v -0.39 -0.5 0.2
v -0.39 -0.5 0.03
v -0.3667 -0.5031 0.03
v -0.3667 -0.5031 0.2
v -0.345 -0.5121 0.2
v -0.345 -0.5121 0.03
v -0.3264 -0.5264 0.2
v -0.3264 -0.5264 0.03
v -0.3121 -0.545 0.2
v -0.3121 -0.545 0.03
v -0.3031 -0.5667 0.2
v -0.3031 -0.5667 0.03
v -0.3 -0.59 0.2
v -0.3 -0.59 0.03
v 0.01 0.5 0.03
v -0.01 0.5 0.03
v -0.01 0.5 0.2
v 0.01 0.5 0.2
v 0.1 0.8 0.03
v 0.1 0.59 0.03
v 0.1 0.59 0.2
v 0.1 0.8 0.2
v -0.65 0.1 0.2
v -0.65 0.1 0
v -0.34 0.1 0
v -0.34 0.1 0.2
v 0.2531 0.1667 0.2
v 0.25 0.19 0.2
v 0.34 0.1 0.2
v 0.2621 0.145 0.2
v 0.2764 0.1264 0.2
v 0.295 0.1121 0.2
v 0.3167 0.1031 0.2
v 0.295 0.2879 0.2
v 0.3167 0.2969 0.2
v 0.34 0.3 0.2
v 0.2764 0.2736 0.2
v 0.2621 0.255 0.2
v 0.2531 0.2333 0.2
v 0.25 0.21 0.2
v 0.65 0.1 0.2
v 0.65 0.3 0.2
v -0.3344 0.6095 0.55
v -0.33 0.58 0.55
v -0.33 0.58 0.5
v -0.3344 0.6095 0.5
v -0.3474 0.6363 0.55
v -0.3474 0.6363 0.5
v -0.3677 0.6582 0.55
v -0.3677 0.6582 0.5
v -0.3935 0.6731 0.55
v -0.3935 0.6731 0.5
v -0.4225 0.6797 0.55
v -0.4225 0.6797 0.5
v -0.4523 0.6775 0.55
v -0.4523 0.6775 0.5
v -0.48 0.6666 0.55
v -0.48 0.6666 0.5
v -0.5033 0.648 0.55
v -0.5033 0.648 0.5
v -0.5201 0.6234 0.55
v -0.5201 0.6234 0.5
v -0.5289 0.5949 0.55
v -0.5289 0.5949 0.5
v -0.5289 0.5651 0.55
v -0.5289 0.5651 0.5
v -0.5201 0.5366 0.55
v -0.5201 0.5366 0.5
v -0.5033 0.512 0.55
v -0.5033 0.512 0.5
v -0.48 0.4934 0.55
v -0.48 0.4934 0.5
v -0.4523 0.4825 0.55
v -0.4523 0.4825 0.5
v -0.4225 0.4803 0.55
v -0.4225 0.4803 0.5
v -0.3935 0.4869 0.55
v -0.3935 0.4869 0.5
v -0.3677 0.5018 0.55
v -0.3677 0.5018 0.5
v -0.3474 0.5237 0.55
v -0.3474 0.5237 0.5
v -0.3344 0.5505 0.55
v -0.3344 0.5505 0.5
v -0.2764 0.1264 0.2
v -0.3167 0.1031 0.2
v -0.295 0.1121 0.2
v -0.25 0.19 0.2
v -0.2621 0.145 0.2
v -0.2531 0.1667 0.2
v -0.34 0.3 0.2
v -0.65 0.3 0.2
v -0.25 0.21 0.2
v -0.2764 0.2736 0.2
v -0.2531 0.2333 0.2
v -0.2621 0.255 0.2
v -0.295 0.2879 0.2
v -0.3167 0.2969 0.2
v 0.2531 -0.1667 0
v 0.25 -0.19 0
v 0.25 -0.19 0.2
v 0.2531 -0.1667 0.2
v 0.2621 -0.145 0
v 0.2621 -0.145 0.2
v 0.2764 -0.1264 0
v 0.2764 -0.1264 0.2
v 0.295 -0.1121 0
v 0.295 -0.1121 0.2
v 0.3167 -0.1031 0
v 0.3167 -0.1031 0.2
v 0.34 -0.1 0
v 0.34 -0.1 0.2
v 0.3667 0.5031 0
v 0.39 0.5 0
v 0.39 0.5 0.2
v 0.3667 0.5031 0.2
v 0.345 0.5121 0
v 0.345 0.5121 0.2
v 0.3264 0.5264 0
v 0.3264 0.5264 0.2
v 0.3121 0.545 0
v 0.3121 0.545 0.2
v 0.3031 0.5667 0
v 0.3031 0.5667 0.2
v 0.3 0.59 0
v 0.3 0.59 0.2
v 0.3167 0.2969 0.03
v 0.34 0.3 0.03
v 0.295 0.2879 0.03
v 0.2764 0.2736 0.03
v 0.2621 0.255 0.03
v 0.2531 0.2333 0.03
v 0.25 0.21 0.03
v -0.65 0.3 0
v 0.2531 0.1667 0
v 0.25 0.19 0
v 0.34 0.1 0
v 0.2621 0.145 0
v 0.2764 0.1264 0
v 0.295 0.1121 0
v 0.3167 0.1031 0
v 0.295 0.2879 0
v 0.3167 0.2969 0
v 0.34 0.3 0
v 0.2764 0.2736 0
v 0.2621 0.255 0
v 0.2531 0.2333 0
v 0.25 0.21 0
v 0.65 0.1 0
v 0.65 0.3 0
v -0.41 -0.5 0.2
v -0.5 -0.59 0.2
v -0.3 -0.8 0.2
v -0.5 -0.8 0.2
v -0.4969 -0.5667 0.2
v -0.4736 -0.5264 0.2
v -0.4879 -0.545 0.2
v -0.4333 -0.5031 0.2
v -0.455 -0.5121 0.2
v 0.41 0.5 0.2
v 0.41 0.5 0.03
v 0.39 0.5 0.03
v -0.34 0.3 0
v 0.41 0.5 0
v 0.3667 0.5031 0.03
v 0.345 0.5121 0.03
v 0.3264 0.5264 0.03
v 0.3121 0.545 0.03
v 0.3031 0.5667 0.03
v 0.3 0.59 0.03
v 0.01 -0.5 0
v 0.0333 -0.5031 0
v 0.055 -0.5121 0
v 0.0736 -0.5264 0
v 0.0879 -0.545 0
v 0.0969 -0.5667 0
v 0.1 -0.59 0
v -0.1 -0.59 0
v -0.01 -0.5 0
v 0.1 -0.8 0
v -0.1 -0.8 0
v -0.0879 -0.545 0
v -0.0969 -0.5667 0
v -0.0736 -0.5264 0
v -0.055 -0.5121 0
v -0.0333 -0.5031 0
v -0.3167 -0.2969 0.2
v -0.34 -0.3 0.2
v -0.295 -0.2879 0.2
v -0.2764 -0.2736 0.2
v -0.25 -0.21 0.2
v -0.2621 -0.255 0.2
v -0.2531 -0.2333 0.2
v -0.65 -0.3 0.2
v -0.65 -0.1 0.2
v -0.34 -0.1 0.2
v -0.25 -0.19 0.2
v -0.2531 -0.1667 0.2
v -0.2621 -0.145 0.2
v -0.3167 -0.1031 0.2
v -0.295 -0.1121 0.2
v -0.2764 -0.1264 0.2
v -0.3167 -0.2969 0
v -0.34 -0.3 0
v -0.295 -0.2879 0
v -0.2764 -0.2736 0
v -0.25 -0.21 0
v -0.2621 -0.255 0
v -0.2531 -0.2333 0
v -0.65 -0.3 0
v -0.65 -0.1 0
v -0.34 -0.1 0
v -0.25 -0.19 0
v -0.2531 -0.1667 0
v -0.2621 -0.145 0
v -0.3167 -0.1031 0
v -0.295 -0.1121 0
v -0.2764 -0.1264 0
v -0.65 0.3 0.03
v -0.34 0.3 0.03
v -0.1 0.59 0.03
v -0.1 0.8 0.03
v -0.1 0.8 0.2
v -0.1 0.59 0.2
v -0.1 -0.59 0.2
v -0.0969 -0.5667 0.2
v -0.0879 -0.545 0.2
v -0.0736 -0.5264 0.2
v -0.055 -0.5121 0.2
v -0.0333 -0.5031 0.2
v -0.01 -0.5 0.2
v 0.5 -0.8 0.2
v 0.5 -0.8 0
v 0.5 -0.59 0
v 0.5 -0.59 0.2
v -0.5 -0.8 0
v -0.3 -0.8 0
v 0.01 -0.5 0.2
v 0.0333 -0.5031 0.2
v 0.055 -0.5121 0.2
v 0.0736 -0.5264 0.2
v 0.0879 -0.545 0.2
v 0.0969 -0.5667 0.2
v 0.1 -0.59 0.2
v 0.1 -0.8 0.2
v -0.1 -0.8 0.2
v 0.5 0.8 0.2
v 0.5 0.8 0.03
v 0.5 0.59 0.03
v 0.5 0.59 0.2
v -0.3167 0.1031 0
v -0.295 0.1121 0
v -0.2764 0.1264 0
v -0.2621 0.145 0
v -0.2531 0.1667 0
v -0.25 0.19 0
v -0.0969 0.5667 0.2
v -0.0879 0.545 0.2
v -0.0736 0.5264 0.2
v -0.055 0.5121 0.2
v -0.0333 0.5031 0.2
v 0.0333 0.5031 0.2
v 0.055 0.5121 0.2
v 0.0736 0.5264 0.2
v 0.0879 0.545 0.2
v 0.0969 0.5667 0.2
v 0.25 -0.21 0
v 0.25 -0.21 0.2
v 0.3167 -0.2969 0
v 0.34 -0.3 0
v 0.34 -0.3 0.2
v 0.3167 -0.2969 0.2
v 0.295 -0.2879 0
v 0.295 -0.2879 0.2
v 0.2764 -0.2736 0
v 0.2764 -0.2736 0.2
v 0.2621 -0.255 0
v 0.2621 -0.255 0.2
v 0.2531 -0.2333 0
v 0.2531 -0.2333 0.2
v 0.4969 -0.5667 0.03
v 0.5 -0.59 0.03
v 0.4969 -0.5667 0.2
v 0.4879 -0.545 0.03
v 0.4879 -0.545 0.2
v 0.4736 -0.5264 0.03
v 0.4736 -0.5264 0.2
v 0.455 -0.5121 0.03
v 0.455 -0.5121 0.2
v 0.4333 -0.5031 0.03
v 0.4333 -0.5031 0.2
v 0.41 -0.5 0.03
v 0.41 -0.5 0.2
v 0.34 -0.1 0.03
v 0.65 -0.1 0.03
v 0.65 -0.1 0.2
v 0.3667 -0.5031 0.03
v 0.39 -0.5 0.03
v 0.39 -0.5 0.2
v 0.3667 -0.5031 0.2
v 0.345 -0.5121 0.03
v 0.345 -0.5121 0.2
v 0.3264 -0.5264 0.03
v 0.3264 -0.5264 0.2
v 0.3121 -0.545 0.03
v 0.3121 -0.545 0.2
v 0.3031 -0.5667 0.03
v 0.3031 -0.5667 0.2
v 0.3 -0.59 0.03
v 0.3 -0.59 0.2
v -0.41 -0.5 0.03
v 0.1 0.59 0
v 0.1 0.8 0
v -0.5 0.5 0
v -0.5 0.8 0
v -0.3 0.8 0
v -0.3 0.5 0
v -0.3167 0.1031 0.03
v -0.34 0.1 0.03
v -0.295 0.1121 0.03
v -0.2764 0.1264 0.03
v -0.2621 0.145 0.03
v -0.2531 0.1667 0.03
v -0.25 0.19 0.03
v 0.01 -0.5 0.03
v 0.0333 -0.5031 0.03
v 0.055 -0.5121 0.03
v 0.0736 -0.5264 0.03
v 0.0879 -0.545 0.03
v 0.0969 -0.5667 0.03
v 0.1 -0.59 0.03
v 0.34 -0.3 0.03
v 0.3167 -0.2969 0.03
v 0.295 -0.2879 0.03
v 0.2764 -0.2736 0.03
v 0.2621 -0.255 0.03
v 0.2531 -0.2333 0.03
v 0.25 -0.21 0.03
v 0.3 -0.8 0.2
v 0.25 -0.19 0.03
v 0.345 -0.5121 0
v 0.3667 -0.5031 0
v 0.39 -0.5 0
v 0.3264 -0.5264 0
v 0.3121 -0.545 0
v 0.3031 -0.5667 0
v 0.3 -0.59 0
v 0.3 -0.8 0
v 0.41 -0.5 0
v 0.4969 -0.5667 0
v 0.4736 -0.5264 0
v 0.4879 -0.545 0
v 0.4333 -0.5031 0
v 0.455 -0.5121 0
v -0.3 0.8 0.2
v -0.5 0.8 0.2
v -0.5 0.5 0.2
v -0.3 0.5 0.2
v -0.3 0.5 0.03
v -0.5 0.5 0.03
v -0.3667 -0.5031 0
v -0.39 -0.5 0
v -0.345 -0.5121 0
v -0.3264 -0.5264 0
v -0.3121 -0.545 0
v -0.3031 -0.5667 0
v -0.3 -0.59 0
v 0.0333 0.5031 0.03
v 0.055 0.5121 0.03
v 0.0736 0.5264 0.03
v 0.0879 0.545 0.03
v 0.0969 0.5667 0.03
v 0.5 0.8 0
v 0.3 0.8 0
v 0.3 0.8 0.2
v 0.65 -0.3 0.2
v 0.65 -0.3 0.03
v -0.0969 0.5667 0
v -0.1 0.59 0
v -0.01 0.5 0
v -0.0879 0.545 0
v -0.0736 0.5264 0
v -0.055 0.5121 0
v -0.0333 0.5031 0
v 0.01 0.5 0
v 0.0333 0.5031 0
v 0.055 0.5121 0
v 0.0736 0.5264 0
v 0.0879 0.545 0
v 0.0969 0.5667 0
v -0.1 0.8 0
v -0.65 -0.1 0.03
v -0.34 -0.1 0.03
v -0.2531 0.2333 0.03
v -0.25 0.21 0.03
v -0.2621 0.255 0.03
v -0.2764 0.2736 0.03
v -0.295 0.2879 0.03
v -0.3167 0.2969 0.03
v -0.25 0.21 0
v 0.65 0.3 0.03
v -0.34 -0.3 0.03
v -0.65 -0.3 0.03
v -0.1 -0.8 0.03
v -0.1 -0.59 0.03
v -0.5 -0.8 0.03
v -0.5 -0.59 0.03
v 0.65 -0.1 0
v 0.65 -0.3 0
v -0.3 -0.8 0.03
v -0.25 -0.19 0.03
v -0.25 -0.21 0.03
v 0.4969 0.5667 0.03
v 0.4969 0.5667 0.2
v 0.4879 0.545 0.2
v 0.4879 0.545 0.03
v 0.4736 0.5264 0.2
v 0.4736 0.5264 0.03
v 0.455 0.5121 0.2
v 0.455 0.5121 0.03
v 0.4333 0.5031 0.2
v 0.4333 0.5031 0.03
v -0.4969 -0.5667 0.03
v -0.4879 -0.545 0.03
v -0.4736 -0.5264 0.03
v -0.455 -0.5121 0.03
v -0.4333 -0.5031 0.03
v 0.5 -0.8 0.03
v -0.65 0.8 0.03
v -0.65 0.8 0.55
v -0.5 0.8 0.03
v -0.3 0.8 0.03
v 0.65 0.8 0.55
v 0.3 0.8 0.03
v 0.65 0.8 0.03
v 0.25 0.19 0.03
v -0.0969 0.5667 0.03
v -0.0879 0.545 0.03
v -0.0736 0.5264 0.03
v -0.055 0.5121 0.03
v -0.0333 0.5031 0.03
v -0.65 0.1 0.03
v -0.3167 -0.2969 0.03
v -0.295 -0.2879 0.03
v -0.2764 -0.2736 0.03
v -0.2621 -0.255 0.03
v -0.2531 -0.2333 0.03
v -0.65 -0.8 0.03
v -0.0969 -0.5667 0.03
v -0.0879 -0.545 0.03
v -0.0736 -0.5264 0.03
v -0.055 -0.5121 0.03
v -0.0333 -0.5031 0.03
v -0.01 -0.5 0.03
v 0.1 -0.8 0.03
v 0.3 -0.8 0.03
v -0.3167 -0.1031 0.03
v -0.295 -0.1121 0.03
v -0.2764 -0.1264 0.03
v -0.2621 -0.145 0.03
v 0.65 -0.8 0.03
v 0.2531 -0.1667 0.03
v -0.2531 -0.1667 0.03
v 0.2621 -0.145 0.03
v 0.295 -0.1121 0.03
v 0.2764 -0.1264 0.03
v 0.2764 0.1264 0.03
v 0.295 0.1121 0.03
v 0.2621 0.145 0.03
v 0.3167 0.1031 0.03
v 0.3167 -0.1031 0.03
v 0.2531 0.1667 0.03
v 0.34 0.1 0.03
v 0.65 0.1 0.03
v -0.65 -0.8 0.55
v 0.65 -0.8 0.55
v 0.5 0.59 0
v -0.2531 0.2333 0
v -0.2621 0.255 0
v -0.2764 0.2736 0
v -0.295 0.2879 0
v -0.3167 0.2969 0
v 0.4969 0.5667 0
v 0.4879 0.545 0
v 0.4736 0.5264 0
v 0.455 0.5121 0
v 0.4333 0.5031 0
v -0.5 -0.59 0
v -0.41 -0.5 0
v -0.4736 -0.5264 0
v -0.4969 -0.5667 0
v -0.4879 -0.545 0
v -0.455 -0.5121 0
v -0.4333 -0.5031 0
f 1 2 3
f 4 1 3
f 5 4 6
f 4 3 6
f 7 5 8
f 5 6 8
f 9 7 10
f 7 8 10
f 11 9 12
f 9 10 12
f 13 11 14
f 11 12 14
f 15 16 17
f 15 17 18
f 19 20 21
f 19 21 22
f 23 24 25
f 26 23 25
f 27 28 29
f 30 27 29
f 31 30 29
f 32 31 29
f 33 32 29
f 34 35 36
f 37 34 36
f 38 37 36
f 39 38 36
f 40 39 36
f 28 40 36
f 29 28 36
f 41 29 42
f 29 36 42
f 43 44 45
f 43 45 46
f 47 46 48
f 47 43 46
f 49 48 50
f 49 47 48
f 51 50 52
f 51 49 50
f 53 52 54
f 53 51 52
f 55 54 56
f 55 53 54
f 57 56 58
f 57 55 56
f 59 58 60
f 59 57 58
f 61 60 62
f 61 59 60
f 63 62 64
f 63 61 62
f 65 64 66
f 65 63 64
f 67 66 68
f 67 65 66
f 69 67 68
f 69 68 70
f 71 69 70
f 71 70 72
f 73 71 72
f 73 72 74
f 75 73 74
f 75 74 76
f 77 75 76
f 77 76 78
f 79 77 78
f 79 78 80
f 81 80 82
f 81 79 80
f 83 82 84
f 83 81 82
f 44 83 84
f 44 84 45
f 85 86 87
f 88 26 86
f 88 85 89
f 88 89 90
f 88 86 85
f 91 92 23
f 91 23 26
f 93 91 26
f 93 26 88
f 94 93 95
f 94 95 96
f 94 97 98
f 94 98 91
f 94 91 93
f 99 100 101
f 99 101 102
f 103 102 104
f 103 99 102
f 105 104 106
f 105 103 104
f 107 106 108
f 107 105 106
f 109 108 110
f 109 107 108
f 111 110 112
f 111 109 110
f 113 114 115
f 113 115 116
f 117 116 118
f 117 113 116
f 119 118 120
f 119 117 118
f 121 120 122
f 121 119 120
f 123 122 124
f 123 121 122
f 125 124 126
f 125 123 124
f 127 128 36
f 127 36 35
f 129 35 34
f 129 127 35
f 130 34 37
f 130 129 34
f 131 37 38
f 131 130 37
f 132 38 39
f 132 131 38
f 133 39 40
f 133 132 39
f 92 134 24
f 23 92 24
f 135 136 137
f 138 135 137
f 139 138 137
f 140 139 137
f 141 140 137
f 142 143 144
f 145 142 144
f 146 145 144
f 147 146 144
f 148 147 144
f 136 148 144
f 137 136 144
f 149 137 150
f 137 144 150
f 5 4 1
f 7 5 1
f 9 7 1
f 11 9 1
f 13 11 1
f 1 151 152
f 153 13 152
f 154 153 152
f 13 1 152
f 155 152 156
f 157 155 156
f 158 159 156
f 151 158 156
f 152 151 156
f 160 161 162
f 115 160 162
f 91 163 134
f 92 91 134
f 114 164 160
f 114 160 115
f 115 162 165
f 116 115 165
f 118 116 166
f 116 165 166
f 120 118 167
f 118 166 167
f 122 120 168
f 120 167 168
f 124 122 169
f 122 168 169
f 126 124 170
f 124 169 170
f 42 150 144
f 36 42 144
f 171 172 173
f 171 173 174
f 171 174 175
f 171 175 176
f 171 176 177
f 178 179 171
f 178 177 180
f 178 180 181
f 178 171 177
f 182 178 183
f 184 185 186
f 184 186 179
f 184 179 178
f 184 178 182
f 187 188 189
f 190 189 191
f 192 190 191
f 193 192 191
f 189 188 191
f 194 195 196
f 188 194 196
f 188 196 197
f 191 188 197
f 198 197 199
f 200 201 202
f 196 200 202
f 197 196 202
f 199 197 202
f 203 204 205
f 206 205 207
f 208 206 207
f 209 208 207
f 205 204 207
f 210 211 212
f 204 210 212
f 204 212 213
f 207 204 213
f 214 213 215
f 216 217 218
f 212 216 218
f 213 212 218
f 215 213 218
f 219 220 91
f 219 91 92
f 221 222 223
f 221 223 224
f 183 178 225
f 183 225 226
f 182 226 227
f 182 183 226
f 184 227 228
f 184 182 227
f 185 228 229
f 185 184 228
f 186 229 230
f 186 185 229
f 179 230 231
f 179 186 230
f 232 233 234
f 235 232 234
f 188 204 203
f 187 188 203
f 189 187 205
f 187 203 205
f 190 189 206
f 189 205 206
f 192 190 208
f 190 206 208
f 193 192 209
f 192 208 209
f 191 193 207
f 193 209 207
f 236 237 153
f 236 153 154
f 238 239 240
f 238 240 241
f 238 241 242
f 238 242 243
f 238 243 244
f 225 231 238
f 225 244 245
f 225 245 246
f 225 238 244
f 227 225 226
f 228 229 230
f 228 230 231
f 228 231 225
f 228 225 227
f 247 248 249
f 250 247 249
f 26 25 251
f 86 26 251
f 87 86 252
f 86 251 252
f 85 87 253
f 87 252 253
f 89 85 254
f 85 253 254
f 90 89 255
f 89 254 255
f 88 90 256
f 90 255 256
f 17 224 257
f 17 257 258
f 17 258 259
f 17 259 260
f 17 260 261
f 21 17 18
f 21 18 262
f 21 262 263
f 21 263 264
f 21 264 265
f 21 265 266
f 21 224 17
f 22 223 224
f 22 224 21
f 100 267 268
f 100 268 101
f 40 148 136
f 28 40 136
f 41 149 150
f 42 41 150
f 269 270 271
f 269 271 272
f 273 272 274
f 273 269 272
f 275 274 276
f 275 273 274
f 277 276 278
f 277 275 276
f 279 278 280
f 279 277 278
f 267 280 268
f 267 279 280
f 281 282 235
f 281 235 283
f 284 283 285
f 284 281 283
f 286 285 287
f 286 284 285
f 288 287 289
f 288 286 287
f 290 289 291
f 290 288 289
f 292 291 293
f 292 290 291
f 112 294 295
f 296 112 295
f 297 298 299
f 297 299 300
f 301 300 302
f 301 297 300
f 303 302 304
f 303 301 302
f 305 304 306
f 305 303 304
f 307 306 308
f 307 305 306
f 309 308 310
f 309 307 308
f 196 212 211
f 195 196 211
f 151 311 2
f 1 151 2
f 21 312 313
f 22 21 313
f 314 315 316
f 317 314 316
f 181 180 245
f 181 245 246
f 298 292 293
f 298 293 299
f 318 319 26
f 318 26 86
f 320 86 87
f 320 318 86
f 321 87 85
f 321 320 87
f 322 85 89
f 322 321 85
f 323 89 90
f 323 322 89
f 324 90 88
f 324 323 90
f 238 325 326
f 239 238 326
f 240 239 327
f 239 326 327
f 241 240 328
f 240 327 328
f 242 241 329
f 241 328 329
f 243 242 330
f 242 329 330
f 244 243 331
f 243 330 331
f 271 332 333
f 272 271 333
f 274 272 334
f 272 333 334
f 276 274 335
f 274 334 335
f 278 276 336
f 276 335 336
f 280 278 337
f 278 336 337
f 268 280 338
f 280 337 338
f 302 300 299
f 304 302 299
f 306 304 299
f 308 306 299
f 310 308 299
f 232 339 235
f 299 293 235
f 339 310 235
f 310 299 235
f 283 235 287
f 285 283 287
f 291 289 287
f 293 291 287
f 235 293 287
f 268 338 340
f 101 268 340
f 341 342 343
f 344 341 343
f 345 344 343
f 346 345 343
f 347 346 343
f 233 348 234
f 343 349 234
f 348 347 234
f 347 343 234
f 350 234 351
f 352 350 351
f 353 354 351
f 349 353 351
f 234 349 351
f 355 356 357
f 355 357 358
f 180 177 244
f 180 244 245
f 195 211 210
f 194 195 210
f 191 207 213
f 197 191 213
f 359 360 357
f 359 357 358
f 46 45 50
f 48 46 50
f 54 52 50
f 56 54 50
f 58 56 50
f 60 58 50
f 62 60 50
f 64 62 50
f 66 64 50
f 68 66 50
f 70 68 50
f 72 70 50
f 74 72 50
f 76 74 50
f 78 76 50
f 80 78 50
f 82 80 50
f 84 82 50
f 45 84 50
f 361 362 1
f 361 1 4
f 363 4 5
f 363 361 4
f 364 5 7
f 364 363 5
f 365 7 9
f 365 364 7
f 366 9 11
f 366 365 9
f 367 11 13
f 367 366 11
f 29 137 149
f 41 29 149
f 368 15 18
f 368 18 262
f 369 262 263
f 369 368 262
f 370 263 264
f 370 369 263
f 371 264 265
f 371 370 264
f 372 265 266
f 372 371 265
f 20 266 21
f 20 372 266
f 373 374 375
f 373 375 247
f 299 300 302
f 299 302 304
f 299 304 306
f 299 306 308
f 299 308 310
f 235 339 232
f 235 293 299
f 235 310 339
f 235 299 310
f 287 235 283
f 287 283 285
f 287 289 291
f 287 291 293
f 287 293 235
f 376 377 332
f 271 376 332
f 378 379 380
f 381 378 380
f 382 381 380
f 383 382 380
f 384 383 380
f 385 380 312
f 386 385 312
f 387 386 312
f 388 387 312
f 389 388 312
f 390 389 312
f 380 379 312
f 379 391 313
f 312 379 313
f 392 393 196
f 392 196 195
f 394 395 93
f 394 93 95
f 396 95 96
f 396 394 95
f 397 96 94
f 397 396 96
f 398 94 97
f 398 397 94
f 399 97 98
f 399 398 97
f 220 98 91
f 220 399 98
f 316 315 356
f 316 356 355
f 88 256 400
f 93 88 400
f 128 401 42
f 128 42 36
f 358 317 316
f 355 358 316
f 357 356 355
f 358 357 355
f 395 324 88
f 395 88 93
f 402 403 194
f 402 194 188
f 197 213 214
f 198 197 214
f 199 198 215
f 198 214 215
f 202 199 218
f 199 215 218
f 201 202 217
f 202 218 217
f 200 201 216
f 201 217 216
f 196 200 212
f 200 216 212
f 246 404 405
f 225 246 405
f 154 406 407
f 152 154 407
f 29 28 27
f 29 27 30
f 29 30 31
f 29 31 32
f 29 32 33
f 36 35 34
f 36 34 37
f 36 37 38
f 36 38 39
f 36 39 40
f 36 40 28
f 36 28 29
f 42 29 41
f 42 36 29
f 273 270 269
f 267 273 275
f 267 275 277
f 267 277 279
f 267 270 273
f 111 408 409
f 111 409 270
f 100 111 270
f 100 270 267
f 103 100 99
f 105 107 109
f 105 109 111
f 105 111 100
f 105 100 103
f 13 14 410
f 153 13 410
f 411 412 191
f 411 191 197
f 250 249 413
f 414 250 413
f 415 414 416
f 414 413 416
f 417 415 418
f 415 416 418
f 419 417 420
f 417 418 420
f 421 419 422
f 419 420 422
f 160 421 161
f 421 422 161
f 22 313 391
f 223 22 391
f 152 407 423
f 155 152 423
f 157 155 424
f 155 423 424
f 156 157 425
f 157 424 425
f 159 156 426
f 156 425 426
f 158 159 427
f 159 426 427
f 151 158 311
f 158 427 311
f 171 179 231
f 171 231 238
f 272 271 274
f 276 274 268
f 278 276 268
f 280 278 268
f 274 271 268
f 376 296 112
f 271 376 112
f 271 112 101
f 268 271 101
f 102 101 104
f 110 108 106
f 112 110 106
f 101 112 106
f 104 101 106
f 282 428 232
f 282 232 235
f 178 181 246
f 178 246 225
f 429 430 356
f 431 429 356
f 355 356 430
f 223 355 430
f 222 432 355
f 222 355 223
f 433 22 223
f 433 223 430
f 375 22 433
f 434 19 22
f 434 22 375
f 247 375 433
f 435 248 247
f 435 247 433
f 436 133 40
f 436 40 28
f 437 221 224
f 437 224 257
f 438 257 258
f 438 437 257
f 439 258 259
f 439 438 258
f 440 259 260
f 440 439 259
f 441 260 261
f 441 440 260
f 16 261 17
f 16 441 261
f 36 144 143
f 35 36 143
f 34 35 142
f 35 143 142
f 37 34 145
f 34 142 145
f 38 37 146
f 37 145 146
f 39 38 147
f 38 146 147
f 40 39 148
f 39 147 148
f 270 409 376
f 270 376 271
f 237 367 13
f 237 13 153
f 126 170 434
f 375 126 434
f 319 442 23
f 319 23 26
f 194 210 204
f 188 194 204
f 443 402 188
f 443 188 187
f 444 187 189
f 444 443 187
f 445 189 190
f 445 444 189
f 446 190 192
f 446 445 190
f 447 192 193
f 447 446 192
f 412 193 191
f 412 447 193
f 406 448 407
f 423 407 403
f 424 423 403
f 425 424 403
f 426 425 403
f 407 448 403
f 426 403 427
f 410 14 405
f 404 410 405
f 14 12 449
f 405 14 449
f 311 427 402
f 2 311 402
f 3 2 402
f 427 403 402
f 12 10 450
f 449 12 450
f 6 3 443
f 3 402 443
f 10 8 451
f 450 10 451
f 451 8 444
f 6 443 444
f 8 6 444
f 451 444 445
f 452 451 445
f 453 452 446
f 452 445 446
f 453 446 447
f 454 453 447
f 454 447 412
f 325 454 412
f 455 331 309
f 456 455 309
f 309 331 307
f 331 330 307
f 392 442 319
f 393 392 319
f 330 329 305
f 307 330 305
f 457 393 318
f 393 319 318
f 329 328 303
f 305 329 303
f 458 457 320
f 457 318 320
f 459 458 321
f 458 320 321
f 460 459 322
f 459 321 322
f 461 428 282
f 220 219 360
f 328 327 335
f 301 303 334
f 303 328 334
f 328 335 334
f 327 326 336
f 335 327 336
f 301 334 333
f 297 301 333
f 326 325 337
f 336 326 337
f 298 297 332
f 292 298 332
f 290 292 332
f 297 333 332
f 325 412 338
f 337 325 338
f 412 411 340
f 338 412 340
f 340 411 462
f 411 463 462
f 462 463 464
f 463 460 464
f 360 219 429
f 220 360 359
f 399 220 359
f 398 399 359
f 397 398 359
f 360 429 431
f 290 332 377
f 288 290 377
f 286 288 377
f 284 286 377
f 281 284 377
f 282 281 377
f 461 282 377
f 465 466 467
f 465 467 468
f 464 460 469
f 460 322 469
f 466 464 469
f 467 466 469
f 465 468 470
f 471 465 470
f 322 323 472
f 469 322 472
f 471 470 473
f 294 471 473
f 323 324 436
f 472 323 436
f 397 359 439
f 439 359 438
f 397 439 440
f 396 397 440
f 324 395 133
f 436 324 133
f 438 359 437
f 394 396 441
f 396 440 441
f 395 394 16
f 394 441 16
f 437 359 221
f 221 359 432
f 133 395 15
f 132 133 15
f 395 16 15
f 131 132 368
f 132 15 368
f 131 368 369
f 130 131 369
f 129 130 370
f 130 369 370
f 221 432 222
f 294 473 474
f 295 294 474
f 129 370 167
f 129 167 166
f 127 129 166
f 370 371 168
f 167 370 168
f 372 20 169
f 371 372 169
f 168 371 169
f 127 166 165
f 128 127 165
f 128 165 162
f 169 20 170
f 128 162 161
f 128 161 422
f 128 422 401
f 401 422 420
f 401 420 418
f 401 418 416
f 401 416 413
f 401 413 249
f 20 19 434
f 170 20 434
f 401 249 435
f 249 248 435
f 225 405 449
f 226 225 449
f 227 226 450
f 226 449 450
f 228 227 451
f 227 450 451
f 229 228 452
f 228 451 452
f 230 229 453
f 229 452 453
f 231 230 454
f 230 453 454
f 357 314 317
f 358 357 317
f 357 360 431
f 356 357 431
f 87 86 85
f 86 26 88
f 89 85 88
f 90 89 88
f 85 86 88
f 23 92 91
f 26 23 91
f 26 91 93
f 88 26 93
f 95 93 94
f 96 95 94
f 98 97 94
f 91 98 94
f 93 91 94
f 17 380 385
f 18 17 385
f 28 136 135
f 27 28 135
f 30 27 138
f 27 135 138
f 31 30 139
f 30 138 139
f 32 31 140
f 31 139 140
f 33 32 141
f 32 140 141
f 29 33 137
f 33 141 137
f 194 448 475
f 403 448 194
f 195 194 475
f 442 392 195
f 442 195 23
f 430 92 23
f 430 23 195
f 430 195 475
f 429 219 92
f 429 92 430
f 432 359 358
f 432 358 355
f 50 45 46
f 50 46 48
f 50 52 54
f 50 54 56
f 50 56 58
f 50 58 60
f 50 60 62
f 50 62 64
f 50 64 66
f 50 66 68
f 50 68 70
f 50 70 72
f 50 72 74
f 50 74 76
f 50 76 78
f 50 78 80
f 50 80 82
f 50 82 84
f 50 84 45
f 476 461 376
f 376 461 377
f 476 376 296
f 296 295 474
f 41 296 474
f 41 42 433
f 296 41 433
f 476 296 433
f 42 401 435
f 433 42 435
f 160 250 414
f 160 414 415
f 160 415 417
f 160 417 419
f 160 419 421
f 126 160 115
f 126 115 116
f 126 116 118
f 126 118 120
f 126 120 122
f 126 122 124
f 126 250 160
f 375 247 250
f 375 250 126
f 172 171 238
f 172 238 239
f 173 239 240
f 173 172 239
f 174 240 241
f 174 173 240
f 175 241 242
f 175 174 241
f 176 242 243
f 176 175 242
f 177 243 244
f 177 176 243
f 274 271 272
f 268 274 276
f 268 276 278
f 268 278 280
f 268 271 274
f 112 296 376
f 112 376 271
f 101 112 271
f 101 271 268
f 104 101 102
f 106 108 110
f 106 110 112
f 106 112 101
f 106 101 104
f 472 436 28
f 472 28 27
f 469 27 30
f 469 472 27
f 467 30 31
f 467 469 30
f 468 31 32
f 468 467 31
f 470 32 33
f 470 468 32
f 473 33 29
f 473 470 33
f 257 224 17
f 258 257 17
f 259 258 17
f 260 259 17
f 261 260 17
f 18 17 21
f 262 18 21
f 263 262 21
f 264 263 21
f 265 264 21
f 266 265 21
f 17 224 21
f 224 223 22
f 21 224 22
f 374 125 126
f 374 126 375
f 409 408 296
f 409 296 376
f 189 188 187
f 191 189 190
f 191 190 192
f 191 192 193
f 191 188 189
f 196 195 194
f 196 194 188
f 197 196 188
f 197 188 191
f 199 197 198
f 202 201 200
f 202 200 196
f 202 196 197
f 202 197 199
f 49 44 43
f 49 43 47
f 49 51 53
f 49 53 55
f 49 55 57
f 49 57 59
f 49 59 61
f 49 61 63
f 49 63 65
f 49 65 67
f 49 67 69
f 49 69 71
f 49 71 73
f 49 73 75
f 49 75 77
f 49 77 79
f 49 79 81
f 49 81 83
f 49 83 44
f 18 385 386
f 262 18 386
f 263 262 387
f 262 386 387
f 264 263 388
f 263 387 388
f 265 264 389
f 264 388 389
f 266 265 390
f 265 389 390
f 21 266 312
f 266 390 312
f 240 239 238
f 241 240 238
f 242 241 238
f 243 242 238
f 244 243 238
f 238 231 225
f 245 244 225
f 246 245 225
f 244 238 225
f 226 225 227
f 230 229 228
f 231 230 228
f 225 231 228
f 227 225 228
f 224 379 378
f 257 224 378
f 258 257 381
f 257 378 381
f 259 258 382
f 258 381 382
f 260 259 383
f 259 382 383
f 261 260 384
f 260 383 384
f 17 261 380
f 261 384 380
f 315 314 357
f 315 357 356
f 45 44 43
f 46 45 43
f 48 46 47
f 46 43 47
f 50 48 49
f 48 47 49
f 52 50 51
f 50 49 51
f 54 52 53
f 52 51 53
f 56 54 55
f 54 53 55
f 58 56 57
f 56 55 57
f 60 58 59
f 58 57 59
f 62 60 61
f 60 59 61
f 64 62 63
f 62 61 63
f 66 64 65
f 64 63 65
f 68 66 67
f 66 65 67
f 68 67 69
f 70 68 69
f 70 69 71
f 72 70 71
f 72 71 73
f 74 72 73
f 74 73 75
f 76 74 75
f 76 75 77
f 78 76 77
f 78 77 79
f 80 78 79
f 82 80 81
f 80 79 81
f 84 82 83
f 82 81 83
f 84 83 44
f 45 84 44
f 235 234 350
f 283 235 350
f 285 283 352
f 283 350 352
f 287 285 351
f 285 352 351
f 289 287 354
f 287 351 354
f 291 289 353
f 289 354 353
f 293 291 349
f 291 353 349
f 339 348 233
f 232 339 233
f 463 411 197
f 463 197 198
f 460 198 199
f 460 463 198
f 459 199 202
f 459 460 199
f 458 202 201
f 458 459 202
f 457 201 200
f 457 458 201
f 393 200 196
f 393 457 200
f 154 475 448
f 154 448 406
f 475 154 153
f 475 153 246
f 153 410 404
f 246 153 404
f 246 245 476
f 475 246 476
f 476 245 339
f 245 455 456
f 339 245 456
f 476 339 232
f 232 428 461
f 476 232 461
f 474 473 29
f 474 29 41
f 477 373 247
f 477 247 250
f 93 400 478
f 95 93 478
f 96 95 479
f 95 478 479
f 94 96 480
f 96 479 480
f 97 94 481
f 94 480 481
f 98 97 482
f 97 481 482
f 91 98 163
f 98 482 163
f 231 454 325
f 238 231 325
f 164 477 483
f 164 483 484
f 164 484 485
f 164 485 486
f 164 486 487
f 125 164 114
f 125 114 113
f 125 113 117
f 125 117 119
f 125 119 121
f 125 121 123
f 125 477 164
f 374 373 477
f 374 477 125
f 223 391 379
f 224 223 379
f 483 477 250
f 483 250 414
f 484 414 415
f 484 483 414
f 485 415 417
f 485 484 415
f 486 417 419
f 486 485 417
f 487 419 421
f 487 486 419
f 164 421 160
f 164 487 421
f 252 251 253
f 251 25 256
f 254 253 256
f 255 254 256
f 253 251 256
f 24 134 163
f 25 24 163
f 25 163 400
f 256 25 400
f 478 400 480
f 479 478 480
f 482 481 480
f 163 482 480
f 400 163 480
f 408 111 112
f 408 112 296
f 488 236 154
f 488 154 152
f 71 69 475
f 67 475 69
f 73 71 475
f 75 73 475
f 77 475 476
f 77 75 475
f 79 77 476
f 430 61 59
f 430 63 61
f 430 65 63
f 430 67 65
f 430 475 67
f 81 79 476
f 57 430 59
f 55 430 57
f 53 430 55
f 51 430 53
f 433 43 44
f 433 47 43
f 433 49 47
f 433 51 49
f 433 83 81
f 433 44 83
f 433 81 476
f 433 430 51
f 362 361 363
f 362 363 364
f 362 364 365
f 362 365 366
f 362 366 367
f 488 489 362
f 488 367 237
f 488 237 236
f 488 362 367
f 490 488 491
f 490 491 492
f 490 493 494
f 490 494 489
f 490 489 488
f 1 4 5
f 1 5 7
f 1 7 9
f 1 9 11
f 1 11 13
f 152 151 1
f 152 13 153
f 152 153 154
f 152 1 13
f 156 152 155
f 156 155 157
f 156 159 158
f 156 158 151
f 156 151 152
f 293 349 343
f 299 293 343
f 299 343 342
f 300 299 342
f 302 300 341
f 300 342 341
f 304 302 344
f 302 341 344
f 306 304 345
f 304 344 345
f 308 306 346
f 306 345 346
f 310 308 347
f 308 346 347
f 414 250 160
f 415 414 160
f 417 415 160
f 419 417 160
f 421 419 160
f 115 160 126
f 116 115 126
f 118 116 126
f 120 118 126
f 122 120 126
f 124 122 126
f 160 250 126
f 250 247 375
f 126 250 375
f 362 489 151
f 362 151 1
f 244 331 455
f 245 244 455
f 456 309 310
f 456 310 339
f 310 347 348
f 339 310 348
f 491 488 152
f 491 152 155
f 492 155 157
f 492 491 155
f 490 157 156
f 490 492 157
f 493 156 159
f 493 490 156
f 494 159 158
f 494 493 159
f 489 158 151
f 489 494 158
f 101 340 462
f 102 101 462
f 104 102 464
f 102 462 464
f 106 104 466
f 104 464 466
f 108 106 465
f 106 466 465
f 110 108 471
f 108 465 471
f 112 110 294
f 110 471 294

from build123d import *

# Parameters (mm, degrees)
EXTRUDE_START       = 0.03
SKETCH_1_W          = 1.3
SKETCH_1_H          = 1.6
EXTRUDE_1_DEPTH     = 0.52
SKETCH_2_R          = 0.1
CUT_EXTRUDE_1_DEPTH = 0.05
SKETCH_2_2_R        = 0.1
EXTRUDE_1_2_DEPTH   = 0.05
SKETCH_3_W          = 0.2
SKETCH_3_H          = 0.3
CUT_EXTRUDE_2_DEPTH = 0.2
EXTRUDE_2_DEPTH     = 0.2
EXTRUDE_2_2_DEPTH   = 0.2
EXTRUDE_2_3_DEPTH   = 0.2
EXTRUDE_2_4_DEPTH   = 0.2
EXTRUDE_2_5_DEPTH   = 0.2
EXTRUDE_2_6_DEPTH   = 0.2
EXTRUDE_2_7_DEPTH   = 0.2
EXTRUDE_2_8_DEPTH   = 0.2
EXTRUDE_2_9_DEPTH   = 0.2
SKETCH_3_2_W        = 0.2
SKETCH_3_2_H        = 0.3
EXTRUDE_2_10_DEPTH  = 0.2


with BuildPart() as part:
    # Эскиз1 → Extrude 1 (new body)
    with BuildSketch(Plane.XY.offset(EXTRUDE_START)):
        Rectangle(SKETCH_1_W, SKETCH_1_H)
    extrude(amount=EXTRUDE_1_DEPTH)

    # Эскиз2 → Вырез-Вытянуть1 (cut)
    with BuildSketch(Plane.XY.offset(0.55)):
        with Locations((-0.43, 0.58)):
            Circle(SKETCH_2_R)
    extrude(amount=-CUT_EXTRUDE_1_DEPTH, mode=Mode.SUBTRACT)

    # Эскиз3 → Вырез-Вытянуть2 (cut)
    with BuildSketch(Plane.XY):
        with BuildLine():
            Line((-0.01, 0.5), (0.01, 0.5))
            ThreePointArc((0.01, 0.5), (0.07363961, 0.52636039), (0.1, 0.59))
            Line((0.1, 0.59), (0.1, 0.8))
            Line((0.1, 0.8), (-0.1, 0.8))
            Line((-0.1, 0.8), (-0.1, 0.59))
            ThreePointArc((-0.1, 0.59), (-0.07363961, 0.52636039), (-0.01, 0.5))
        make_face()
        with BuildLine():
            Line((-0.01, -0.5), (0.01, -0.5))
            ThreePointArc((0.01, -0.5), (0.07363961, -0.52636039), (0.1, -0.59))
            Line((0.1, -0.59), (0.1, -0.8))
            Line((0.1, -0.8), (-0.1, -0.8))
            Line((-0.1, -0.8), (-0.1, -0.59))
            ThreePointArc((-0.1, -0.59), (-0.07363961, -0.52636039), (-0.01, -0.5))
        make_face()
        with BuildLine():
            Line((-0.41, -0.5), (-0.39, -0.5))
            ThreePointArc((-0.39, -0.5), (-0.32636039, -0.52636039), (-0.3, -0.59))
            Line((-0.3, -0.59), (-0.3, -0.8))
            Line((-0.3, -0.8), (-0.5, -0.8))
            Line((-0.5, -0.8), (-0.5, -0.59))
            ThreePointArc((-0.5, -0.59), (-0.47363961, -0.52636039), (-0.41, -0.5))
        make_face()
        with BuildLine():
            Line((0.3, -0.8), (0.5, -0.8))
            Line((0.5, -0.8), (0.5, -0.59))
            ThreePointArc((0.5, -0.59), (0.47363961, -0.52636039), (0.41, -0.5))
            Line((0.41, -0.5), (0.39, -0.5))
            ThreePointArc((0.39, -0.5), (0.32636039, -0.52636039), (0.3, -0.59))
            Line((0.3, -0.59), (0.3, -0.8))
        make_face()
        with BuildLine():
            Line((0.65, -0.1), (0.65, -0.3))
            Line((0.65, -0.3), (0.34, -0.3))
            ThreePointArc((0.34, -0.3), (0.27636039, -0.27363961), (0.25, -0.21))
            Line((0.25, -0.21), (0.25, -0.19))
            ThreePointArc((0.25, -0.19), (0.27636039, -0.12636039), (0.34, -0.1))
            Line((0.34, -0.1), (0.65, -0.1))
        make_face()
        with BuildLine():
            Line((0.34, 0.1), (0.65, 0.1))
            Line((0.65, 0.1), (0.65, 0.3))
            Line((0.65, 0.3), (0.34, 0.3))
            ThreePointArc((0.34, 0.3), (0.27636039, 0.27363961), (0.25, 0.21))
            Line((0.25, 0.21), (0.25, 0.19))
            ThreePointArc((0.25, 0.19), (0.27636039, 0.12636039), (0.34, 0.1))
        make_face()
        with BuildLine():
            Line((-0.65, -0.1), (-0.65, -0.3))
            Line((-0.65, -0.3), (-0.34, -0.3))
            ThreePointArc((-0.34, -0.3), (-0.27636039, -0.27363961), (-0.25, -0.21))
            Line((-0.25, -0.21), (-0.25, -0.19))
            ThreePointArc((-0.25, -0.19), (-0.27636039, -0.12636039), (-0.34, -0.1))
            Line((-0.34, -0.1), (-0.65, -0.1))
        make_face()
        with BuildLine():
            Line((-0.25, 0.19), (-0.25, 0.21))
            ThreePointArc((-0.25, 0.21), (-0.27636039, 0.27363961), (-0.34, 0.3))
            Line((-0.34, 0.3), (-0.65, 0.3))
            Line((-0.65, 0.3), (-0.65, 0.1))
            Line((-0.65, 0.1), (-0.34, 0.1))
            ThreePointArc((-0.34, 0.1), (-0.27636039, 0.12636039), (-0.25, 0.19))
        make_face()
        with BuildLine():
            Line((0.3, 0.59), (0.3, 0.8))
            Line((0.3, 0.8), (0.5, 0.8))
            Line((0.5, 0.8), (0.5, 0.59))
            ThreePointArc((0.5, 0.59), (0.47363961, 0.52636039), (0.41, 0.5))
            Line((0.41, 0.5), (0.39, 0.5))
            ThreePointArc((0.39, 0.5), (0.32636039, 0.52636039), (0.3, 0.59))
        make_face()
        with Locations((-0.4, 0.65)):
            Rectangle(SKETCH_3_W, SKETCH_3_H)
    extrude(amount=CUT_EXTRUDE_2_DEPTH, mode=Mode.SUBTRACT)


with BuildPart() as body_2:
    # Эскиз2<2> → Extrude 1 2 (new body)
    with BuildSketch(Plane.XY.offset(0.55)):
        with Locations((-0.43, 0.58)):
            Circle(SKETCH_2_2_R)
    extrude(amount=-EXTRUDE_1_2_DEPTH)


with BuildPart() as body_3:
    # Эскиз3<2> → Бобышка-Вытянуть2 (new body)
    with BuildSketch(Plane.XY):
        with BuildLine():
            Line((-0.01, 0.5), (0.01, 0.5))
            ThreePointArc((0.01, 0.5), (0.07363961, 0.52636039), (0.1, 0.59))
            Line((0.1, 0.59), (0.1, 0.8))
            Line((0.1, 0.8), (-0.1, 0.8))
            Line((-0.1, 0.8), (-0.1, 0.59))
            ThreePointArc((-0.1, 0.59), (-0.07363961, 0.52636039), (-0.01, 0.5))
        make_face()
    extrude(amount=EXTRUDE_2_DEPTH)


with BuildPart() as body_4:
    # Эскиз3<2> → Extrude 2 2 (new body)
    with BuildSketch(Plane.XY):
        with BuildLine():
            Line((-0.01, -0.5), (0.01, -0.5))
            ThreePointArc((0.01, -0.5), (0.07363961, -0.52636039), (0.1, -0.59))
            Line((0.1, -0.59), (0.1, -0.8))
            Line((0.1, -0.8), (-0.1, -0.8))
            Line((-0.1, -0.8), (-0.1, -0.59))
            ThreePointArc((-0.1, -0.59), (-0.07363961, -0.52636039), (-0.01, -0.5))
        make_face()
    extrude(amount=EXTRUDE_2_2_DEPTH)


with BuildPart() as body_5:
    # Эскиз3<2> → Extrude 2 3 (new body)
    with BuildSketch(Plane.XY):
        with BuildLine():
            Line((-0.41, -0.5), (-0.39, -0.5))
            ThreePointArc((-0.39, -0.5), (-0.32636039, -0.52636039), (-0.3, -0.59))
            Line((-0.3, -0.59), (-0.3, -0.8))
            Line((-0.3, -0.8), (-0.5, -0.8))
            Line((-0.5, -0.8), (-0.5, -0.59))
            ThreePointArc((-0.5, -0.59), (-0.47363961, -0.52636039), (-0.41, -0.5))
        make_face()
    extrude(amount=EXTRUDE_2_3_DEPTH)


with BuildPart() as body_6:
    # Эскиз3<2> → Extrude 2 4 (new body)
    with BuildSketch(Plane.XY):
        with BuildLine():
            Line((0.3, -0.8), (0.5, -0.8))
            Line((0.5, -0.8), (0.5, -0.59))
            ThreePointArc((0.5, -0.59), (0.47363961, -0.52636039), (0.41, -0.5))
            Line((0.41, -0.5), (0.39, -0.5))
            ThreePointArc((0.39, -0.5), (0.32636039, -0.52636039), (0.3, -0.59))
            Line((0.3, -0.59), (0.3, -0.8))
        make_face()
    extrude(amount=EXTRUDE_2_4_DEPTH)


with BuildPart() as body_7:
    # Эскиз3<2> → Extrude 2 5 (new body)
    with BuildSketch(Plane.XY):
        with BuildLine():
            Line((0.65, -0.1), (0.65, -0.3))
            Line((0.65, -0.3), (0.34, -0.3))
            ThreePointArc((0.34, -0.3), (0.27636039, -0.27363961), (0.25, -0.21))
            Line((0.25, -0.21), (0.25, -0.19))
            ThreePointArc((0.25, -0.19), (0.27636039, -0.12636039), (0.34, -0.1))
            Line((0.34, -0.1), (0.65, -0.1))
        make_face()
    extrude(amount=EXTRUDE_2_5_DEPTH)


with BuildPart() as body_8:
    # Эскиз3<2> → Extrude 2 6 (new body)
    with BuildSketch(Plane.XY):
        with BuildLine():
            Line((0.34, 0.1), (0.65, 0.1))
            Line((0.65, 0.1), (0.65, 0.3))
            Line((0.65, 0.3), (0.34, 0.3))
            ThreePointArc((0.34, 0.3), (0.27636039, 0.27363961), (0.25, 0.21))
            Line((0.25, 0.21), (0.25, 0.19))
            ThreePointArc((0.25, 0.19), (0.27636039, 0.12636039), (0.34, 0.1))
        make_face()
    extrude(amount=EXTRUDE_2_6_DEPTH)


with BuildPart() as body_9:
    # Эскиз3<2> → Extrude 2 7 (new body)
    with BuildSketch(Plane.XY):
        with BuildLine():
            Line((-0.65, -0.1), (-0.65, -0.3))
            Line((-0.65, -0.3), (-0.34, -0.3))
            ThreePointArc((-0.34, -0.3), (-0.27636039, -0.27363961), (-0.25, -0.21))
            Line((-0.25, -0.21), (-0.25, -0.19))
            ThreePointArc((-0.25, -0.19), (-0.27636039, -0.12636039), (-0.34, -0.1))
            Line((-0.34, -0.1), (-0.65, -0.1))
        make_face()
    extrude(amount=EXTRUDE_2_7_DEPTH)


with BuildPart() as body_10:
    # Эскиз3<2> → Extrude 2 8 (new body)
    with BuildSketch(Plane.XY):
        with BuildLine():
            Line((-0.25, 0.19), (-0.25, 0.21))
            ThreePointArc((-0.25, 0.21), (-0.27636039, 0.27363961), (-0.34, 0.3))
            Line((-0.34, 0.3), (-0.65, 0.3))
            Line((-0.65, 0.3), (-0.65, 0.1))
            Line((-0.65, 0.1), (-0.34, 0.1))
            ThreePointArc((-0.34, 0.1), (-0.27636039, 0.12636039), (-0.25, 0.19))
        make_face()
    extrude(amount=EXTRUDE_2_8_DEPTH)


with BuildPart() as body_11:
    # Эскиз3<2> → Extrude 2 9 (new body)
    with BuildSketch(Plane.XY):
        with BuildLine():
            Line((0.3, 0.59), (0.3, 0.8))
            Line((0.3, 0.8), (0.5, 0.8))
            Line((0.5, 0.8), (0.5, 0.59))
            ThreePointArc((0.5, 0.59), (0.47363961, 0.52636039), (0.41, 0.5))
            Line((0.41, 0.5), (0.39, 0.5))
            ThreePointArc((0.39, 0.5), (0.32636039, 0.52636039), (0.3, 0.59))
        make_face()
    extrude(amount=EXTRUDE_2_9_DEPTH)


with BuildPart() as body_12:
    # Эскиз3<2> → Extrude 2 10 (new body)
    with BuildSketch(Plane.XY):
        with Locations((-0.4, 0.65)):
            Rectangle(SKETCH_3_2_W, SKETCH_3_2_H)
    extrude(amount=EXTRUDE_2_10_DEPTH)


solid = Compound([part.part, body_2.part, body_3.part, body_4.part, body_5.part, body_6.part, body_7.part, body_8.part, body_9.part, body_10.part, body_11.part, body_12.part])
